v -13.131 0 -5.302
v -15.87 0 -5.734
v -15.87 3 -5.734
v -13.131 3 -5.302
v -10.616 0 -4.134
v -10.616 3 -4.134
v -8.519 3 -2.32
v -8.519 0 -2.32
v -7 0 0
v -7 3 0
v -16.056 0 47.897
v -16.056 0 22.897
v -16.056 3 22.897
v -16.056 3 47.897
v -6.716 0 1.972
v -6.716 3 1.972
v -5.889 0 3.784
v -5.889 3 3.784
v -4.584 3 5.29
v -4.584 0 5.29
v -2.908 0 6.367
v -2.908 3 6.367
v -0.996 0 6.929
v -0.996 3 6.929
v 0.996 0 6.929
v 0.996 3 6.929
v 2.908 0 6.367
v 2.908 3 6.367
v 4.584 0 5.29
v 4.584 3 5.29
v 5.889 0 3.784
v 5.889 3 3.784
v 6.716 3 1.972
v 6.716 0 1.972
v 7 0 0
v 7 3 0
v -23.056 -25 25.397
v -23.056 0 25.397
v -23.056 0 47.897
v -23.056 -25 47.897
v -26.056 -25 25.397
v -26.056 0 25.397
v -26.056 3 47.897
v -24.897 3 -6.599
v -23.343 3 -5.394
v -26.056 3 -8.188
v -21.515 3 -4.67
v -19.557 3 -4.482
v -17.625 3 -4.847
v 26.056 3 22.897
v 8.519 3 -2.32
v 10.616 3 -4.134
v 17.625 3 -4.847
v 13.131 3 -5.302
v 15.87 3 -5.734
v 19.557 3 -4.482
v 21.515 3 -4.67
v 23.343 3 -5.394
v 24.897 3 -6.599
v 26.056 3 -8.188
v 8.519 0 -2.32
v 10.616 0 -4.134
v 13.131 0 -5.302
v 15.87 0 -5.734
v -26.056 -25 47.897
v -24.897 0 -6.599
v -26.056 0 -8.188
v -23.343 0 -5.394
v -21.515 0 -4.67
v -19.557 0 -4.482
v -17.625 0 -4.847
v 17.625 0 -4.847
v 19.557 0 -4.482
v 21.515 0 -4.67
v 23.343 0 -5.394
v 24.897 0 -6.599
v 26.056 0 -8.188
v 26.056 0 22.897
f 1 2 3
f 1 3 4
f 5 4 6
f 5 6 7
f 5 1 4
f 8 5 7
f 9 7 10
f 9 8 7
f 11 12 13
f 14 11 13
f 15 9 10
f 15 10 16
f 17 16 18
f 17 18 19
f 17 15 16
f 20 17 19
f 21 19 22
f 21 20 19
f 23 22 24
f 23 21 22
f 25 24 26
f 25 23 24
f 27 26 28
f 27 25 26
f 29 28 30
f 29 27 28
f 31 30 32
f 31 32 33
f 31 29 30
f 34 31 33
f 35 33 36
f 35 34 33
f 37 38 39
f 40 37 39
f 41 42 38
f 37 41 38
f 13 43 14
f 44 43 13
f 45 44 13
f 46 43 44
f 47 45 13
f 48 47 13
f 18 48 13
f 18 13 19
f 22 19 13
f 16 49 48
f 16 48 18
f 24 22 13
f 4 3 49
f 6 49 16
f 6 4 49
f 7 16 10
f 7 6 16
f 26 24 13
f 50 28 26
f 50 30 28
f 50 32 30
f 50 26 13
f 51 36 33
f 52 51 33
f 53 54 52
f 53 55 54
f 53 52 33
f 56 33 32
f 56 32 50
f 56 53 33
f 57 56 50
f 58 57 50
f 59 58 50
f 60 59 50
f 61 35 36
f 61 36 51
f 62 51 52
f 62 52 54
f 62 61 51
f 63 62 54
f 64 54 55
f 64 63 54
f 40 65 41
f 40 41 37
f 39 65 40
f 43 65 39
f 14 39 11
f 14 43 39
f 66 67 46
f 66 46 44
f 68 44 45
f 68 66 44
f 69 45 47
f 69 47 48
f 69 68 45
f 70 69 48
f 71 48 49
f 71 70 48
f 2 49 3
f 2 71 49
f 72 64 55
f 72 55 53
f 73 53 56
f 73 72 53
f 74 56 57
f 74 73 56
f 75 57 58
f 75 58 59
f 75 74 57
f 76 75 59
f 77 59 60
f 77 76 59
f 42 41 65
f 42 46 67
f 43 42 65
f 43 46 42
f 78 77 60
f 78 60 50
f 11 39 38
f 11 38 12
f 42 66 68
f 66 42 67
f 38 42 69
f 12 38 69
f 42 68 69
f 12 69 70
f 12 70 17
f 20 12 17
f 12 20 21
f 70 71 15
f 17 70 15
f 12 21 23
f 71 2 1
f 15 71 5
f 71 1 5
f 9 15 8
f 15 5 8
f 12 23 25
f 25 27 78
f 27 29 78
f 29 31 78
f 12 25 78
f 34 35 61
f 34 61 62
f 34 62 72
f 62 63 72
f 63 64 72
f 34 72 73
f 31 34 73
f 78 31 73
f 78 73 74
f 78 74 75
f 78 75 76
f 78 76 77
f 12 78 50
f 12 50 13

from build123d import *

# Parameters (mm, degrees)
BOSS_EXTRUDE1_DEPTH = 3
SKETCH3_W           = 10
SKETCH3_H           = 3
BOSS_EXTRUDE2_DEPTH = 25
SKETCH4_W           = 3
SKETCH4_H           = 22.5
BOSS_EXTRUDE3_DEPTH = 25


with BuildPart() as part:
    # Sketch2 → Boss-Extrude1 (new body)
    with BuildSketch(Plane(origin=(0, 0, 0), x_dir=(1, 0, 0), z_dir=(0, 1, 0))):
        with BuildLine():
            Line((26.055569119, 8.188046441), (26.055569119, -22.896953559))
            Line((26.055569119, -22.896953559), (-26.055569119, -22.896953559))
            Line((-26.055569119, -22.896953559), (-26.055569119, 8.188046441))
            ThreePointArc((-26.055569119, 8.188046441), (-21.514872246, 4.669726518), (-15.870079226, 5.73406431))
            ThreePointArc((-15.870079226, 5.73406431), (-10.616247764, 4.133629141), (-7, 0))
            ThreePointArc((-7, 0), (0, -7), (7, 0))
            ThreePointArc((7, 0), (10.616247764, 4.133629141), (15.870079226, 5.73406431))
            ThreePointArc((15.870079226, 5.73406431), (21.514872246, 4.669726518), (26.055569119, 8.188046441))
        make_face()
    extrude(amount=BOSS_EXTRUDE1_DEPTH)

    # Sketch3 → Boss-Extrude2 (add)
    with BuildSketch(Plane.XY.offset(22.896953559)):
        with Locations((-21.055569119, 1.5)):
            Rectangle(SKETCH3_W, SKETCH3_H)
    extrude(amount=BOSS_EXTRUDE2_DEPTH)

    # Sketch4 → Boss-Extrude3 (add)
    with BuildSketch(Plane.XZ):
        with Locations((-24.555569119, 36.646953559)):
            Rectangle(SKETCH4_W, SKETCH4_H)
    extrude(amount=BOSS_EXTRUDE3_DEPTH)


solid = part.part
